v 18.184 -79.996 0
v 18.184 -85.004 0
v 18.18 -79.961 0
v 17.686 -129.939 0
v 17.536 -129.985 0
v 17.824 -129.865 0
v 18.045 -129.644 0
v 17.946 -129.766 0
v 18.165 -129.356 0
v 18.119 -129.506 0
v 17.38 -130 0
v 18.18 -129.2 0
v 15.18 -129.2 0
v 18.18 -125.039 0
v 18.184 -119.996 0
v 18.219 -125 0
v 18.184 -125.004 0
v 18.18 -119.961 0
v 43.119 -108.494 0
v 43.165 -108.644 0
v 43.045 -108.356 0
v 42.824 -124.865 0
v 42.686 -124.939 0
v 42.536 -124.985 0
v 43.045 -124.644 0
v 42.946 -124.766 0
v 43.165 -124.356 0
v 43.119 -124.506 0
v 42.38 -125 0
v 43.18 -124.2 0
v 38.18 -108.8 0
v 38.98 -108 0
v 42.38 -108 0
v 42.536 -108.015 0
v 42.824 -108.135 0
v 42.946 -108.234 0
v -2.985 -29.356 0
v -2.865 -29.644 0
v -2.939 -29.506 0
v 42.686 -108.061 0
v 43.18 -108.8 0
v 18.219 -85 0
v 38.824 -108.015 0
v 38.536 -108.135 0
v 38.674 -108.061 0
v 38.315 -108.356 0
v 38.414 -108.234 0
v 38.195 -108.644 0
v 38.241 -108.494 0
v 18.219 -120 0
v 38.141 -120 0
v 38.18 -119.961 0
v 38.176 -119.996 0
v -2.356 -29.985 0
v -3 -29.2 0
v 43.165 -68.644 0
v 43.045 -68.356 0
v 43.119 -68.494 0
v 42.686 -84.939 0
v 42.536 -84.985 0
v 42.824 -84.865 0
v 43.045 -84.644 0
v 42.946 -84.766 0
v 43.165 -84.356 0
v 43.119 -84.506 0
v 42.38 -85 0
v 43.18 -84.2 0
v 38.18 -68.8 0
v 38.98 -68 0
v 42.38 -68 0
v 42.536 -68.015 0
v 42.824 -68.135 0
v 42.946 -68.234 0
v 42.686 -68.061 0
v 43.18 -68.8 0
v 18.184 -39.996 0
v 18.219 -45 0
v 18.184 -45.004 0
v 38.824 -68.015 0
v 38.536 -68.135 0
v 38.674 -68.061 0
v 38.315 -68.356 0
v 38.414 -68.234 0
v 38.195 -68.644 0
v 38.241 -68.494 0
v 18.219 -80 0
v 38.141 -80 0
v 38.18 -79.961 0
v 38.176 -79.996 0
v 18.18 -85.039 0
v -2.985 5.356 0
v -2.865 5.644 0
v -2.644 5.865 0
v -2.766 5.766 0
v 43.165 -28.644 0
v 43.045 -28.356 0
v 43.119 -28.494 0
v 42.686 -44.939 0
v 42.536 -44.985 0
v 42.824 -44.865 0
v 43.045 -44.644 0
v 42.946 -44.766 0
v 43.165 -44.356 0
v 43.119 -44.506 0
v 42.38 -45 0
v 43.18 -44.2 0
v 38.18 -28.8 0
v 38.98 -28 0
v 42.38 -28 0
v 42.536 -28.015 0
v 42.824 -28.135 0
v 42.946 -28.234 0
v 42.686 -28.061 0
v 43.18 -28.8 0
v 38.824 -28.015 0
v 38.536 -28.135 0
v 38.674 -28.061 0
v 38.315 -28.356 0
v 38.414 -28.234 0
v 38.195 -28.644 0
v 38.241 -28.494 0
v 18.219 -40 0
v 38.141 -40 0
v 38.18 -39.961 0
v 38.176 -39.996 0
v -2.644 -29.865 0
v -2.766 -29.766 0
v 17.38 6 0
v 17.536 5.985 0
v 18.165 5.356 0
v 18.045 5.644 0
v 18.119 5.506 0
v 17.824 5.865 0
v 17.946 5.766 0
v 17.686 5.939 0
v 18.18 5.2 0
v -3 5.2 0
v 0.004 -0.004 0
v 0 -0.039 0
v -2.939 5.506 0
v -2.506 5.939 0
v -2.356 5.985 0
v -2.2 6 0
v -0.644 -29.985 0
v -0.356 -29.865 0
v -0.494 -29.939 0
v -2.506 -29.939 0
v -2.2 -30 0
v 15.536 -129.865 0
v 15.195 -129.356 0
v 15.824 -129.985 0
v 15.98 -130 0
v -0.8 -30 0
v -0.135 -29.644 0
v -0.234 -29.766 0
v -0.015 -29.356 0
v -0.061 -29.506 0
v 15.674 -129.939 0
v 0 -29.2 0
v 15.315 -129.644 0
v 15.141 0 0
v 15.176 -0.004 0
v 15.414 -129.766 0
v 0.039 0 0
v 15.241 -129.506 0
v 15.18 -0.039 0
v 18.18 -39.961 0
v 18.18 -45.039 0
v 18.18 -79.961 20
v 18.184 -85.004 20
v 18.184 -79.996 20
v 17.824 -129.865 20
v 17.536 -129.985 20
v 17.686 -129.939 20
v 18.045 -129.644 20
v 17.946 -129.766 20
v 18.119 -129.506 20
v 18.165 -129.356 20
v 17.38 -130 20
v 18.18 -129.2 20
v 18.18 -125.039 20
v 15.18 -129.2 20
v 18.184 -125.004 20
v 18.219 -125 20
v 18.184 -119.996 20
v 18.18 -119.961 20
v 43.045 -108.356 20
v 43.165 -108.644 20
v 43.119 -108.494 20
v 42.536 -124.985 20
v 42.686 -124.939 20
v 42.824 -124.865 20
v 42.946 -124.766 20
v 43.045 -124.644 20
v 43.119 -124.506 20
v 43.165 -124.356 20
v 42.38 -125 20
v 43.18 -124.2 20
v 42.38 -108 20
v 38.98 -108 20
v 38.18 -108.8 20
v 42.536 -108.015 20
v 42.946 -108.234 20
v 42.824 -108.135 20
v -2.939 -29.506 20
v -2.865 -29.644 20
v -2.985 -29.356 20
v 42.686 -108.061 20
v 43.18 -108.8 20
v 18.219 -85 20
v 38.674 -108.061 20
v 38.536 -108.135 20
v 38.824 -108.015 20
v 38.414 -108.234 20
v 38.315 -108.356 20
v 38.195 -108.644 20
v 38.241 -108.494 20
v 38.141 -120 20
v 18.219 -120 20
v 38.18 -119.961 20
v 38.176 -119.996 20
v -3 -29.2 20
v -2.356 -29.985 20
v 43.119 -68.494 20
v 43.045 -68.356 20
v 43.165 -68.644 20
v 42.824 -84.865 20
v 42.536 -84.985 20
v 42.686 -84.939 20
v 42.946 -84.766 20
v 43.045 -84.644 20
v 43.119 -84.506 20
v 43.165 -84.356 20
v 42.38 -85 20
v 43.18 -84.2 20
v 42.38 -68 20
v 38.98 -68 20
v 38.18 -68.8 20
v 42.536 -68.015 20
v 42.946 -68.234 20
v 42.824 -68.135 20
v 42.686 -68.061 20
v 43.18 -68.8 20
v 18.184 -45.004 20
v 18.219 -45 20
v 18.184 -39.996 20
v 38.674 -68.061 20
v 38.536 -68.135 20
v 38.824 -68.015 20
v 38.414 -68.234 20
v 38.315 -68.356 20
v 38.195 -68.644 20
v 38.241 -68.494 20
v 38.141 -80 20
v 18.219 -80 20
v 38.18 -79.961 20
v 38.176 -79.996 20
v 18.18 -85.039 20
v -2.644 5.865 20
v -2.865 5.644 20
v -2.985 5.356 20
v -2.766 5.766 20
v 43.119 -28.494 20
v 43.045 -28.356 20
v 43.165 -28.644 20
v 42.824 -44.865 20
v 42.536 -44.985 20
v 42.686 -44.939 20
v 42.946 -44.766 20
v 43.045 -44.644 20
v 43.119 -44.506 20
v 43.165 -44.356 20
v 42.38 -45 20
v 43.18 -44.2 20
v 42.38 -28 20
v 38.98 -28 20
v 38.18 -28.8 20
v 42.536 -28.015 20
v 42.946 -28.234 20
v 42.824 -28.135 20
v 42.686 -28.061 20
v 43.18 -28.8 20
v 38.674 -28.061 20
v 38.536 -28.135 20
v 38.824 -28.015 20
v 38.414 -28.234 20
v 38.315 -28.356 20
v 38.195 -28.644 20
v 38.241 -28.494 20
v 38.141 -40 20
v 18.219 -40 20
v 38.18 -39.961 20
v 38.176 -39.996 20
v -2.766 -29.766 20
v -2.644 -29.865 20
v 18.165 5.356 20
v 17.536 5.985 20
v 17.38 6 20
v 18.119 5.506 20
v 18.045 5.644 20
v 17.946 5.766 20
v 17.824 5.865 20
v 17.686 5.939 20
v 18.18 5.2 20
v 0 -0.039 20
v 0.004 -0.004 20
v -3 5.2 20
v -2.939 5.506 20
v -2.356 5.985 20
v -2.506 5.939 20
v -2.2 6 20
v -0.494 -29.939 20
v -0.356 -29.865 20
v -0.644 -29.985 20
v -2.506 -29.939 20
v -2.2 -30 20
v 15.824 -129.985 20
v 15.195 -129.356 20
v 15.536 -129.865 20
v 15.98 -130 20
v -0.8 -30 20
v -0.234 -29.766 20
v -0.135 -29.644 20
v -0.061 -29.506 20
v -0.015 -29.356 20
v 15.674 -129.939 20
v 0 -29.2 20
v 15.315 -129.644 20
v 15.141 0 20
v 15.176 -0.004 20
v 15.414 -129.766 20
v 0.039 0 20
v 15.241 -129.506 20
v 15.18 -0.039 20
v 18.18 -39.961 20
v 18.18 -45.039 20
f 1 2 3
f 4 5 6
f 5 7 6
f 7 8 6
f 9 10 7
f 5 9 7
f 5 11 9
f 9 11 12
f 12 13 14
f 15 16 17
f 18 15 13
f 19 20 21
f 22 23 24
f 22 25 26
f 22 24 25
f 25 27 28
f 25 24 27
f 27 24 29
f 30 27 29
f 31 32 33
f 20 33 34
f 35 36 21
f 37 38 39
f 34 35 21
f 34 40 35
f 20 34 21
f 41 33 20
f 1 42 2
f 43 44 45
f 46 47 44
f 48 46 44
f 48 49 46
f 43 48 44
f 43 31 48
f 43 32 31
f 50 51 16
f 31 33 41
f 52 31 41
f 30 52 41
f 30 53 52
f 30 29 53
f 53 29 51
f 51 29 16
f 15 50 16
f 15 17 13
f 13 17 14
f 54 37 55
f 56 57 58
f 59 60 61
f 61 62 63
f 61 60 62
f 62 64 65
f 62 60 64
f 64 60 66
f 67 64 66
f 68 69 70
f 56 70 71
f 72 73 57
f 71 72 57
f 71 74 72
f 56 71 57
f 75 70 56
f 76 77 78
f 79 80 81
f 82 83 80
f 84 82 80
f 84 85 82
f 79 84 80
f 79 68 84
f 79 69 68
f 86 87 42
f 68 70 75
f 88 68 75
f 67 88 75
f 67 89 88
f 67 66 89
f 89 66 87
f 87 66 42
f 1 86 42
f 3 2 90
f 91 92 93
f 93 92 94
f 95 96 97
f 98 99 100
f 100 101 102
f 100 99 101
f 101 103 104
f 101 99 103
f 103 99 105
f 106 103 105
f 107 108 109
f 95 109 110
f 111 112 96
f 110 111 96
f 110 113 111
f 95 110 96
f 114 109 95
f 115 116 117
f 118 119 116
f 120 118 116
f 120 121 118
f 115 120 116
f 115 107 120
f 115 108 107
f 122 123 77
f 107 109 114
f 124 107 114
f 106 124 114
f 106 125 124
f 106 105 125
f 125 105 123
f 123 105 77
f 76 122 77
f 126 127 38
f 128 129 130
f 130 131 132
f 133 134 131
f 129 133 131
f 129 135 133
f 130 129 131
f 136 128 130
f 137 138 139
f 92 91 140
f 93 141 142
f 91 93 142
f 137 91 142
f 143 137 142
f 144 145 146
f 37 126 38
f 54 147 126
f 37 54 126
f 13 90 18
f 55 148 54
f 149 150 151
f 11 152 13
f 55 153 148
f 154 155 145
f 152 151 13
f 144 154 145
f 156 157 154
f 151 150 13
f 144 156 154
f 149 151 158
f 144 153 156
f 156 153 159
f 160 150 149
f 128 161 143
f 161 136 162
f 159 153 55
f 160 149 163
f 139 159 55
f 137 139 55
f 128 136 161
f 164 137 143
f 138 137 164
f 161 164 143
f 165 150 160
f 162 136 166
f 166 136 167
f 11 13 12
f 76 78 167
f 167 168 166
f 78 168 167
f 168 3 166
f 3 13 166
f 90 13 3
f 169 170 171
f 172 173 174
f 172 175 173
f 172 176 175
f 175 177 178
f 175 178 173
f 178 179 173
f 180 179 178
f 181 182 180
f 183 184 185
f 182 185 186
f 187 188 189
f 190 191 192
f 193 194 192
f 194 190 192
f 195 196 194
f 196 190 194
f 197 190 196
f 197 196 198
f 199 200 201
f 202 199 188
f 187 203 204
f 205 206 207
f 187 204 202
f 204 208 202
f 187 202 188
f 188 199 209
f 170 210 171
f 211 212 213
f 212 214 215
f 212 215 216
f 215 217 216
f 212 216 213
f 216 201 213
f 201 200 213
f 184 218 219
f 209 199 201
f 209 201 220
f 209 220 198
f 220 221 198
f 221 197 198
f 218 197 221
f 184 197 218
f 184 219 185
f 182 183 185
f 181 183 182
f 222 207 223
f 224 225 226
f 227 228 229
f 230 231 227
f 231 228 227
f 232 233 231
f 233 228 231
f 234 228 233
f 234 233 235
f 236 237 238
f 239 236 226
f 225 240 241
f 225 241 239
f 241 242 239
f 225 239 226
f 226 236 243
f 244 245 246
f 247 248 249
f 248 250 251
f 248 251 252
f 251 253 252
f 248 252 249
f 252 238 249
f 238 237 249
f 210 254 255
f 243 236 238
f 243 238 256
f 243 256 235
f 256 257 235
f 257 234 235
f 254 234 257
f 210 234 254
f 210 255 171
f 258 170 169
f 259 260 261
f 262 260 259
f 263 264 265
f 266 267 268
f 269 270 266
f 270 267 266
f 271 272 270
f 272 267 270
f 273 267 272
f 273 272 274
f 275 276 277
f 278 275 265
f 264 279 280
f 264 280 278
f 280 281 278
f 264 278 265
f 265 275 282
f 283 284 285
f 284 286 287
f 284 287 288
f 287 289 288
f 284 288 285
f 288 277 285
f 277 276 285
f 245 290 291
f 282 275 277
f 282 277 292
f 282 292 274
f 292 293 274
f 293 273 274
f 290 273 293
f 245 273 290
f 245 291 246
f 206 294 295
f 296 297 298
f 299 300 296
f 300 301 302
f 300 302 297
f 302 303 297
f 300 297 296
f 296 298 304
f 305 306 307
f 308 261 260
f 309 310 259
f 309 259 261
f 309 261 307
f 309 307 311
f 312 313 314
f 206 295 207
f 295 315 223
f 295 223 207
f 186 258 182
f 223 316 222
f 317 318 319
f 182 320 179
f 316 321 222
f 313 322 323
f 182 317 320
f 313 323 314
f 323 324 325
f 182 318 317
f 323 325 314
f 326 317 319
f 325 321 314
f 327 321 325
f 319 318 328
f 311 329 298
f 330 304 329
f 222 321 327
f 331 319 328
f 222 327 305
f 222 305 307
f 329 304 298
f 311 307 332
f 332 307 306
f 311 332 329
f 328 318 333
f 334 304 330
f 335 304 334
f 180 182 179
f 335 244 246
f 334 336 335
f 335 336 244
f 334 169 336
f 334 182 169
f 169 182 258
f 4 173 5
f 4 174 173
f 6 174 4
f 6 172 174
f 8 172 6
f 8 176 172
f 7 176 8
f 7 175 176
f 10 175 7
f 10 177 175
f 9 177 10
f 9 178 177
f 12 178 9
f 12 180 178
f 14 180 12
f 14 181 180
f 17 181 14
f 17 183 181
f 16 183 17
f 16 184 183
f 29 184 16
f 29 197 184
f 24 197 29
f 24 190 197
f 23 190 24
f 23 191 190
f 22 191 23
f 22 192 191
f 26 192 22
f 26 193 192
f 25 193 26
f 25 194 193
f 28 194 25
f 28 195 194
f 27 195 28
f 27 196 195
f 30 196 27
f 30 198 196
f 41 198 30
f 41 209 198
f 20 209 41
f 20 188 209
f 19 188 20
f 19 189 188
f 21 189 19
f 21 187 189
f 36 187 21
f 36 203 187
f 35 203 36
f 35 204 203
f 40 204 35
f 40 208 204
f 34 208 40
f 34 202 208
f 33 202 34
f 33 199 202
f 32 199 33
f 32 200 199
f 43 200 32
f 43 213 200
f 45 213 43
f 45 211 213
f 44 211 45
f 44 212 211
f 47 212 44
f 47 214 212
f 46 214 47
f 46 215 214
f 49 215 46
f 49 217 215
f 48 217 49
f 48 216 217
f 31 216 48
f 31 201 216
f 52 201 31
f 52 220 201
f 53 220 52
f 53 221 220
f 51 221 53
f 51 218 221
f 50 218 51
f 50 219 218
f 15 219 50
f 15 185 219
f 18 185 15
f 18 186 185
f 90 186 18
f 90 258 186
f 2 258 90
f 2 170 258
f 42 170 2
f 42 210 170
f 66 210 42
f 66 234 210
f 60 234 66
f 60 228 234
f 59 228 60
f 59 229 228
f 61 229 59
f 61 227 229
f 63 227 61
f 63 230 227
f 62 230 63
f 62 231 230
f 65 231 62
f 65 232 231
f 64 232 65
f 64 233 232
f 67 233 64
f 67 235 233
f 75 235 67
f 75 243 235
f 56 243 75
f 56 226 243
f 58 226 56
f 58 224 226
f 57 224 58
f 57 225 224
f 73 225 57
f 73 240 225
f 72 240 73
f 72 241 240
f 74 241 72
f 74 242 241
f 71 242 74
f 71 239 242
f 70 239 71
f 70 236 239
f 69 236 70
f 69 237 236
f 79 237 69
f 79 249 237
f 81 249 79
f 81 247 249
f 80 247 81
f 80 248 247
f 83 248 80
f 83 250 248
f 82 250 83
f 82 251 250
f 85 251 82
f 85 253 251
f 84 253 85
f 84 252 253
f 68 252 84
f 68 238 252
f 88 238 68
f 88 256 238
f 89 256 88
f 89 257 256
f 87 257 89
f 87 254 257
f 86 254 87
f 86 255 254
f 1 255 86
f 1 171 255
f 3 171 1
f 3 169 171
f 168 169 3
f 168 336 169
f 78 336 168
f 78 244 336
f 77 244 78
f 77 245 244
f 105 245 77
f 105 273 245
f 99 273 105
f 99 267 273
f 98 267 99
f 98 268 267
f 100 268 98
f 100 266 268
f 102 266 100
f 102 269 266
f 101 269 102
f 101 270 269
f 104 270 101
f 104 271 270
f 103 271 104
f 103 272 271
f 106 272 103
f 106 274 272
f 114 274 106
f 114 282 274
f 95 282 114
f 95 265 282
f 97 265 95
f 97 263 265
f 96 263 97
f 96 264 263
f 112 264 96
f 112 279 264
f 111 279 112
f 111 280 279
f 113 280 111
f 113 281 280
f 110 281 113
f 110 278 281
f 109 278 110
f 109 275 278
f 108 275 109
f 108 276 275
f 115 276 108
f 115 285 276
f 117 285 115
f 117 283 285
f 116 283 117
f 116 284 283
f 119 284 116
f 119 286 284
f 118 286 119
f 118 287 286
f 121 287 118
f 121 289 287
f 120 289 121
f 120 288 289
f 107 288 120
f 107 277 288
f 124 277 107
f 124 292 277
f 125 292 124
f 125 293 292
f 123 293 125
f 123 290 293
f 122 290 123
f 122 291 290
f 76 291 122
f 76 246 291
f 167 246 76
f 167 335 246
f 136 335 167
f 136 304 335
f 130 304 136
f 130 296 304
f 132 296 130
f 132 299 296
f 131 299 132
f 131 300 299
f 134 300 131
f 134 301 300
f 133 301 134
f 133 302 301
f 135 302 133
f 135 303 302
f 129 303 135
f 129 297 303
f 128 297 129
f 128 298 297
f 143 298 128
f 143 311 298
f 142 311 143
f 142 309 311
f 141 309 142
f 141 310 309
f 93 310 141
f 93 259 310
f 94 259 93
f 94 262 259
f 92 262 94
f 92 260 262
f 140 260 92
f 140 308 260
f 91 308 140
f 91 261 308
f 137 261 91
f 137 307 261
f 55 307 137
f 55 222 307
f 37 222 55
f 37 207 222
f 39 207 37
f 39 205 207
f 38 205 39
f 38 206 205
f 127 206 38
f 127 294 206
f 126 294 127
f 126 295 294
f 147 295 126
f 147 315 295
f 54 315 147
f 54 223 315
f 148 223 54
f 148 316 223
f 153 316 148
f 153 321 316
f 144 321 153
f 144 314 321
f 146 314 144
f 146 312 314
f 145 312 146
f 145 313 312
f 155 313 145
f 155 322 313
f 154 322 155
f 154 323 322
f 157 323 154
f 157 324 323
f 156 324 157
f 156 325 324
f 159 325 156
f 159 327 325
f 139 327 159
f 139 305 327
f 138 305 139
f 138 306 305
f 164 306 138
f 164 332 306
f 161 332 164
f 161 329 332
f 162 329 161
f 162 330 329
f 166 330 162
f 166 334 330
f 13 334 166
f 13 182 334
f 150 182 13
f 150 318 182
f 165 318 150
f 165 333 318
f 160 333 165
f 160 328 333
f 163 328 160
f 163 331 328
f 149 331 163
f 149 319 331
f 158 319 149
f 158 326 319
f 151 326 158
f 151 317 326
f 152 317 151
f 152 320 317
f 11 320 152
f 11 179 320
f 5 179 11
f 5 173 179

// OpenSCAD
/**
 * Parametric Door Hanger Generator
 * 
 * NOMENCLATURE:
 * - hanger: The whole assembly.
 * - tail: Part touching the back of the door.
 * - spine: Part touching the front of the door (carries the hooks).
 * - hook: The individual hanger units.
 * - brace: Support material under/inside the hook for weight.
 * - notch: The U-shaped opening of the hook.
 * - basin: The bottom surface of the notch where items rest.
 * - tip: The outermost vertical part of the hook.
 */

// --- Hanger Configuration ---
door_gap = 3;               
door_thickness = 15.18;     
hanger_tail_thickness = 3;  
hanger_width = 20;          
hanger_tail_length = 30;    

// --- Hook Configuration ---
hook_count = 3;             
hook_depth = 25;            
hook_offset = 40;           
hook_thickness = 5;         
hook_up_height = 12;        

// --- Branding & Styling ---
hook_inner_radius = 3;      // Rounds the 'basin' and 'notch'
fillet_radius = 0.8;        // Softens 'tip' and 'spine' edges
$fn = 32;

// --- 1. Hook Component ---
module hook_unit() {
    // We construct the hook so the "basin" is at Y=0
    // To prevent the hook from vanishing, we only offset the 'notch' area
    difference() {
        // The raw hook material (Brace + Basin + Tip)
        union() {
            // Main horizontal body (Basin/Brace area)
            translate([0, -hook_thickness])
                square([hook_depth, hook_thickness]);
            
            // Outer vertical part (Tip)
            translate([hook_depth - hook_thickness, -hook_thickness])
                square([hook_thickness, hook_up_height + hook_thickness]);
        }
        
        // The Notch (the void where things hang)
        // We round the notch by applying an offset to the SUBTRACTED shape
        offset(r = hook_inner_radius)
        offset(r = -hook_inner_radius)
        translate([0, 0])
            square([hook_depth - hook_thickness, hook_up_height + 1]);
    }
}

// --- 2. Spine & Tail (The Bracket) ---
module bracket_profile() {
    // Y=0 is the top of the door.
    // Negative Y goes down the door.
    
    back_x = -hanger_tail_thickness;
    front_x = door_thickness;
    spine_x_outer = door_thickness + hanger_tail_thickness;
    
    // The top cap sits above the door gap
    top_y_outer = door_gap + hanger_tail_thickness;
    top_y_inner = door_gap;
    
    // Spine length covers all hooks
    spine_bottom_y = -(hook_count * hook_offset) - 10;

    polygon(points = [
        [back_x, -hanger_tail_length], // Bottom of tail
        [back_x, top_y_outer],         // Top back corner (outer)
        [spine_x_outer, top_y_outer],  // Top front corner (outer)
        [spine_x_outer, spine_bottom_y], // Bottom of spine (outer)
        [front_x, spine_bottom_y],     // Bottom of spine (inner)
        [front_x, 0],                  // Under top cap (front)
        [0, 0],                        // Under top cap (back)
        [0, -hanger_tail_length]       // Bottom of tail (inner)
    ]);
}

// --- 3. Hook Iterator ---
module hook_generator() {
    spawn_x = door_thickness + hanger_tail_thickness;
    for (i = [1 : hook_count]) {
        // Move each hook down the spine
        translate([spawn_x, -i * hook_offset])
            hook_unit();
    }
}

// --- 4. Main Assembly ---
module assembly() {
    linear_extrude(height = hanger_width) {
        // Global fillet softened to ensure no parts vanish
        offset(r = fillet_radius) 
        offset(r = -fillet_radius) 
        union() {
            bracket_profile();
            hook_generator();
        }
    }
}

assembly();
